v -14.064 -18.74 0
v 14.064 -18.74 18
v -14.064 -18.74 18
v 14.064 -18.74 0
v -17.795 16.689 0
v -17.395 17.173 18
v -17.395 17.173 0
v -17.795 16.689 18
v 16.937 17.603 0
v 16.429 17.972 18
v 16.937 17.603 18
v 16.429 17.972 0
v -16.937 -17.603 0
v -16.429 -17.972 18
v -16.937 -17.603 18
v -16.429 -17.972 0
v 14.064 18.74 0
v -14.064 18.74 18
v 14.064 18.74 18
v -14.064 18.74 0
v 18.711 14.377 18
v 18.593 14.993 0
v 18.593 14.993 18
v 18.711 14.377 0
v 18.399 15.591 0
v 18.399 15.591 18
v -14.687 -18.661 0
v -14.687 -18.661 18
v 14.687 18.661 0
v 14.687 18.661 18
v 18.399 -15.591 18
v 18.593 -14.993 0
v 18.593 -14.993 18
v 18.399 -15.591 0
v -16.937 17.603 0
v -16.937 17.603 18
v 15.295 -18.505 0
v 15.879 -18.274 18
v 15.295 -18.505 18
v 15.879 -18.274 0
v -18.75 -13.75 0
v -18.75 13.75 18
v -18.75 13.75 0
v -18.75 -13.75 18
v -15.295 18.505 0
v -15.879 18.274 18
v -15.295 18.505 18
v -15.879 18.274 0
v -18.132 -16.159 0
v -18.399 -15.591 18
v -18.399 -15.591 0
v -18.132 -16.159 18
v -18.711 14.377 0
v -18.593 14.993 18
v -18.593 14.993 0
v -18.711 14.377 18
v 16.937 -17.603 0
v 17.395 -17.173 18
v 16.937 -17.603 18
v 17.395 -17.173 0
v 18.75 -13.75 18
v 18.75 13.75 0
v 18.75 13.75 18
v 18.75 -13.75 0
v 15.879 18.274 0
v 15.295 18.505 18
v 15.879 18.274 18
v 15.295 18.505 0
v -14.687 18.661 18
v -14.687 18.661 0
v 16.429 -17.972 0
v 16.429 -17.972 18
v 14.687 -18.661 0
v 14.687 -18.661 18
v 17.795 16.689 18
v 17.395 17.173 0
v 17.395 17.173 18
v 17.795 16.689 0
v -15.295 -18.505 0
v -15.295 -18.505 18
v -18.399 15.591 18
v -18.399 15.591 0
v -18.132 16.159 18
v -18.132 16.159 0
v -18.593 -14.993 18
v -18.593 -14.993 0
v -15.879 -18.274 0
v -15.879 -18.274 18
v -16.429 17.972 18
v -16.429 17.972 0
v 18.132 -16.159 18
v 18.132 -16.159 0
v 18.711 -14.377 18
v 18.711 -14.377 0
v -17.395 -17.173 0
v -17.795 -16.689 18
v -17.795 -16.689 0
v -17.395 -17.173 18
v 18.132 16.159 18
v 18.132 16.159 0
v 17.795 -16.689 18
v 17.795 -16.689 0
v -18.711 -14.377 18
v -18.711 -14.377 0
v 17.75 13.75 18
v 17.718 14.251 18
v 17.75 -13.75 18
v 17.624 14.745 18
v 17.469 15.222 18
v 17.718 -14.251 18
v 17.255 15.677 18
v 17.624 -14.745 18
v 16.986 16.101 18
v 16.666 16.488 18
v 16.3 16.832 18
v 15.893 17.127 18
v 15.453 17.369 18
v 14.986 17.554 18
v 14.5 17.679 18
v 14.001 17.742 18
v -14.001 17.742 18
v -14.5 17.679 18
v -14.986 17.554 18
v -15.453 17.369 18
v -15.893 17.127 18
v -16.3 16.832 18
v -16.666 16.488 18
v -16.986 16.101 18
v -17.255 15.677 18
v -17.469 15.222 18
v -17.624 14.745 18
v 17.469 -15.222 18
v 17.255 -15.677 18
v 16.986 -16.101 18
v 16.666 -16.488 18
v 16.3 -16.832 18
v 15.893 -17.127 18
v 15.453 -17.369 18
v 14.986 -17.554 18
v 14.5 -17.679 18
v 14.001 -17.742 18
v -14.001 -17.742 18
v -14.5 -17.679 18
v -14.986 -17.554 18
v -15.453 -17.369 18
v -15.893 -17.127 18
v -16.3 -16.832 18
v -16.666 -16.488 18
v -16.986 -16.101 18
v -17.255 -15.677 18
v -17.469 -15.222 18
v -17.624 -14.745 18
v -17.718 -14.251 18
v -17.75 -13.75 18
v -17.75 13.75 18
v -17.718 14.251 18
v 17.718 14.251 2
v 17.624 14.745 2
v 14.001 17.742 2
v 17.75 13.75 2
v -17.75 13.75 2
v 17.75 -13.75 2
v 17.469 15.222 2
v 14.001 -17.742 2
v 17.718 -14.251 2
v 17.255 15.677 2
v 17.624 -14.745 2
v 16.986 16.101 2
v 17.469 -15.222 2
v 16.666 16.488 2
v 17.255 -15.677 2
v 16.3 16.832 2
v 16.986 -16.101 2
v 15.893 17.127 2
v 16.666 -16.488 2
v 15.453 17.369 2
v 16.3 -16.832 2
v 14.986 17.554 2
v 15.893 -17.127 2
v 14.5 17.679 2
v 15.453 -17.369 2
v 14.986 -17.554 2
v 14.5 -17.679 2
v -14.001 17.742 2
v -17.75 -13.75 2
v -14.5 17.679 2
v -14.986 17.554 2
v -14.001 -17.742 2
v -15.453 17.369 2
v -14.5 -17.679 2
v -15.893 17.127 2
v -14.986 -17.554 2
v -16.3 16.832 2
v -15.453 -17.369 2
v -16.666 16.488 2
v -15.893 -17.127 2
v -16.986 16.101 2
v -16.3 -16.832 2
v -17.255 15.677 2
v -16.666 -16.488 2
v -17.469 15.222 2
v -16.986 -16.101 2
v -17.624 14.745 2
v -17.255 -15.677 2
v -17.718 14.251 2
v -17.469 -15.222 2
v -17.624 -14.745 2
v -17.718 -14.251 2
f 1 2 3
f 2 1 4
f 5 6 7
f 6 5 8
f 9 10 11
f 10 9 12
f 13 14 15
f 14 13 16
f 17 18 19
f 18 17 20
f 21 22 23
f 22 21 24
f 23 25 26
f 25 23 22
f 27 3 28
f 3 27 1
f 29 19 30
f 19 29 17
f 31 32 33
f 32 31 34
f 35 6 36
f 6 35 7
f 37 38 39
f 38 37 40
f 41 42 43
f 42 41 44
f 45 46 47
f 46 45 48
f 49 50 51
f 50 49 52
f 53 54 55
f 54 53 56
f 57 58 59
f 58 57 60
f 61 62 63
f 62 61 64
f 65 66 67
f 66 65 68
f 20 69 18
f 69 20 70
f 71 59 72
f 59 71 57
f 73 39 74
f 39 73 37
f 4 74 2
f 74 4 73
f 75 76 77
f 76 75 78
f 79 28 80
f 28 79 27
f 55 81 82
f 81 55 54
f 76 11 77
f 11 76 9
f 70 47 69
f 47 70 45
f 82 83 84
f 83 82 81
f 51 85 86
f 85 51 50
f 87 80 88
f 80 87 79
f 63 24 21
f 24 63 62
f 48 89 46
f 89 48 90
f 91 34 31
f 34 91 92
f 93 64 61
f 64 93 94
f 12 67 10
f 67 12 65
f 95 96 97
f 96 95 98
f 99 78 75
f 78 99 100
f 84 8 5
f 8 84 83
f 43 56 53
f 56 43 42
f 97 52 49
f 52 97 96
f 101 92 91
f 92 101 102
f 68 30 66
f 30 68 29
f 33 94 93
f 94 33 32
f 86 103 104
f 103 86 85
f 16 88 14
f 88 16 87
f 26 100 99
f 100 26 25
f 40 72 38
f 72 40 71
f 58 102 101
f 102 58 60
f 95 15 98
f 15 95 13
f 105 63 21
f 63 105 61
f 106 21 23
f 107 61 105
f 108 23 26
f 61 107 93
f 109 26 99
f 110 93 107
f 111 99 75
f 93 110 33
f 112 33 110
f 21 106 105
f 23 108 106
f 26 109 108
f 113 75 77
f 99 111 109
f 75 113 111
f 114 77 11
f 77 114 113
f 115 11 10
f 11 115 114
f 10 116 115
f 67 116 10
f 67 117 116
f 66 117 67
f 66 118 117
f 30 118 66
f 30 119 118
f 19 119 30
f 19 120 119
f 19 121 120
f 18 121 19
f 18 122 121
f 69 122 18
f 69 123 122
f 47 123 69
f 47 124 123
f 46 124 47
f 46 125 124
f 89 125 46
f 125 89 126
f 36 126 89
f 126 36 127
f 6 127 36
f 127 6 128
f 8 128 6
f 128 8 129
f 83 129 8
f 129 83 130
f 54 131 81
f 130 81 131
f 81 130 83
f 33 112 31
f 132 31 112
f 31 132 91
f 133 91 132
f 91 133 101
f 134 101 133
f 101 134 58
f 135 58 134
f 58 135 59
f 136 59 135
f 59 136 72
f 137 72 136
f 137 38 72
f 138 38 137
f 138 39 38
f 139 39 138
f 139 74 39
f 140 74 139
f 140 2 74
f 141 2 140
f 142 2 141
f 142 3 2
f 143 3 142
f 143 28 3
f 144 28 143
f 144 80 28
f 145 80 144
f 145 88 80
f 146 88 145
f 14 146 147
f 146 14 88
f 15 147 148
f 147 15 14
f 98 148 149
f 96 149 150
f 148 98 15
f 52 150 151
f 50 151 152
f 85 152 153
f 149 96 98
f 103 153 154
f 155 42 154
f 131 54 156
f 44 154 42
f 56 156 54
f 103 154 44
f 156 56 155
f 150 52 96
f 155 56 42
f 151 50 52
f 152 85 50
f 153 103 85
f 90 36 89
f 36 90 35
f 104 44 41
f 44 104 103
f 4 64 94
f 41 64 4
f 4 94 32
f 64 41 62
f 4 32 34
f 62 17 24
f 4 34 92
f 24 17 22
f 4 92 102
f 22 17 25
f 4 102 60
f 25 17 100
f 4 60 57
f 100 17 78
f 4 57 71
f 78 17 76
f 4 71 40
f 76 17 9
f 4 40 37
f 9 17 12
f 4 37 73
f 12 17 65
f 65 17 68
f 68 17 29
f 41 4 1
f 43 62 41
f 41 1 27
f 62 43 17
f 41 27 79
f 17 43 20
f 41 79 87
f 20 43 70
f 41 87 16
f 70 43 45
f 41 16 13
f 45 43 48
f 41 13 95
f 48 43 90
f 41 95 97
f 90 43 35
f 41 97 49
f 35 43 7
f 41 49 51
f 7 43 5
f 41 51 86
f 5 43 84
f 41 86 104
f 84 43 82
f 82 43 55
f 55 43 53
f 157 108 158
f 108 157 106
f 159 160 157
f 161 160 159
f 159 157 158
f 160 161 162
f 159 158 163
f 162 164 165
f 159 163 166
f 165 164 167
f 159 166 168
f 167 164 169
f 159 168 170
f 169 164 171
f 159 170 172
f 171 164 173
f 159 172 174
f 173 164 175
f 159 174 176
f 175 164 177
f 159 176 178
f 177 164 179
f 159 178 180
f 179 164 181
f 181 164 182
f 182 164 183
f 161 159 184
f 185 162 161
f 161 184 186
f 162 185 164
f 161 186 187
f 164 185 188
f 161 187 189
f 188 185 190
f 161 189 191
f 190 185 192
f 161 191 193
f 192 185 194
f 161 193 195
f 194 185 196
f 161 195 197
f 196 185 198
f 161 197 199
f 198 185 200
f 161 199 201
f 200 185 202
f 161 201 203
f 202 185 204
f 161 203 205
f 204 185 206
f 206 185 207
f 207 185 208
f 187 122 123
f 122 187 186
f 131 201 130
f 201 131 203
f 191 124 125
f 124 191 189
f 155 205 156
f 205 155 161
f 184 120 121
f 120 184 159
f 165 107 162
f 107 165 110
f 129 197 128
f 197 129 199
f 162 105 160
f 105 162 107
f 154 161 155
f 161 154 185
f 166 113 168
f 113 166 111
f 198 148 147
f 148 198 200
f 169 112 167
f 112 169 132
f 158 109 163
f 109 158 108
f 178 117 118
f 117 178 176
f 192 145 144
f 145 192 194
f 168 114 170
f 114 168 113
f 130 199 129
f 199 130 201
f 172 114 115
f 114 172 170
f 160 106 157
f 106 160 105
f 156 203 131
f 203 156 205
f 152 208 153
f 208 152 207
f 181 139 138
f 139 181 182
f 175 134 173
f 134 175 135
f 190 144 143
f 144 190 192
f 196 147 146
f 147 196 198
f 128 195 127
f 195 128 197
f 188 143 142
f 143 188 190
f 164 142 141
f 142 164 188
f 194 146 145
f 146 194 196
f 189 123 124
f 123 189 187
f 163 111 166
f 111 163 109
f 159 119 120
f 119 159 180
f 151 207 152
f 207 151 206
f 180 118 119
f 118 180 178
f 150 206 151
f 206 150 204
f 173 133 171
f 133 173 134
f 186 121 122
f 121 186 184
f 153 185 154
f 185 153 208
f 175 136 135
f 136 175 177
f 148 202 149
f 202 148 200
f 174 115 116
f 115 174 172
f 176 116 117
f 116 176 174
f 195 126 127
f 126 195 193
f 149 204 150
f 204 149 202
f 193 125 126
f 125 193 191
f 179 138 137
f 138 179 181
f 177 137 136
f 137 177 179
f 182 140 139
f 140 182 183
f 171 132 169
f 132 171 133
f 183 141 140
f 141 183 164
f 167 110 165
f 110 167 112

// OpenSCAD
$fn = 50;


difference() {
	union() {
		hull() {
			translate(v = [-13.7500000000, 13.7500000000, 0]) {
				cylinder(h = 18, r = 5);
			}
			translate(v = [13.7500000000, 13.7500000000, 0]) {
				cylinder(h = 18, r = 5);
			}
			translate(v = [-13.7500000000, -13.7500000000, 0]) {
				cylinder(h = 18, r = 5);
			}
			translate(v = [13.7500000000, -13.7500000000, 0]) {
				cylinder(h = 18, r = 5);
			}
		}
	}
	union() {
		translate(v = [0, 0, 2]) {
			hull() {
				translate(v = [-13.7500000000, 13.7500000000, 0]) {
					cylinder(h = 16, r = 4);
				}
				translate(v = [13.7500000000, 13.7500000000, 0]) {
					cylinder(h = 16, r = 4);
				}
				translate(v = [-13.7500000000, -13.7500000000, 0]) {
					cylinder(h = 16, r = 4);
				}
				translate(v = [13.7500000000, -13.7500000000, 0]) {
					cylinder(h = 16, r = 4);
				}
			}
		}
	}
}
